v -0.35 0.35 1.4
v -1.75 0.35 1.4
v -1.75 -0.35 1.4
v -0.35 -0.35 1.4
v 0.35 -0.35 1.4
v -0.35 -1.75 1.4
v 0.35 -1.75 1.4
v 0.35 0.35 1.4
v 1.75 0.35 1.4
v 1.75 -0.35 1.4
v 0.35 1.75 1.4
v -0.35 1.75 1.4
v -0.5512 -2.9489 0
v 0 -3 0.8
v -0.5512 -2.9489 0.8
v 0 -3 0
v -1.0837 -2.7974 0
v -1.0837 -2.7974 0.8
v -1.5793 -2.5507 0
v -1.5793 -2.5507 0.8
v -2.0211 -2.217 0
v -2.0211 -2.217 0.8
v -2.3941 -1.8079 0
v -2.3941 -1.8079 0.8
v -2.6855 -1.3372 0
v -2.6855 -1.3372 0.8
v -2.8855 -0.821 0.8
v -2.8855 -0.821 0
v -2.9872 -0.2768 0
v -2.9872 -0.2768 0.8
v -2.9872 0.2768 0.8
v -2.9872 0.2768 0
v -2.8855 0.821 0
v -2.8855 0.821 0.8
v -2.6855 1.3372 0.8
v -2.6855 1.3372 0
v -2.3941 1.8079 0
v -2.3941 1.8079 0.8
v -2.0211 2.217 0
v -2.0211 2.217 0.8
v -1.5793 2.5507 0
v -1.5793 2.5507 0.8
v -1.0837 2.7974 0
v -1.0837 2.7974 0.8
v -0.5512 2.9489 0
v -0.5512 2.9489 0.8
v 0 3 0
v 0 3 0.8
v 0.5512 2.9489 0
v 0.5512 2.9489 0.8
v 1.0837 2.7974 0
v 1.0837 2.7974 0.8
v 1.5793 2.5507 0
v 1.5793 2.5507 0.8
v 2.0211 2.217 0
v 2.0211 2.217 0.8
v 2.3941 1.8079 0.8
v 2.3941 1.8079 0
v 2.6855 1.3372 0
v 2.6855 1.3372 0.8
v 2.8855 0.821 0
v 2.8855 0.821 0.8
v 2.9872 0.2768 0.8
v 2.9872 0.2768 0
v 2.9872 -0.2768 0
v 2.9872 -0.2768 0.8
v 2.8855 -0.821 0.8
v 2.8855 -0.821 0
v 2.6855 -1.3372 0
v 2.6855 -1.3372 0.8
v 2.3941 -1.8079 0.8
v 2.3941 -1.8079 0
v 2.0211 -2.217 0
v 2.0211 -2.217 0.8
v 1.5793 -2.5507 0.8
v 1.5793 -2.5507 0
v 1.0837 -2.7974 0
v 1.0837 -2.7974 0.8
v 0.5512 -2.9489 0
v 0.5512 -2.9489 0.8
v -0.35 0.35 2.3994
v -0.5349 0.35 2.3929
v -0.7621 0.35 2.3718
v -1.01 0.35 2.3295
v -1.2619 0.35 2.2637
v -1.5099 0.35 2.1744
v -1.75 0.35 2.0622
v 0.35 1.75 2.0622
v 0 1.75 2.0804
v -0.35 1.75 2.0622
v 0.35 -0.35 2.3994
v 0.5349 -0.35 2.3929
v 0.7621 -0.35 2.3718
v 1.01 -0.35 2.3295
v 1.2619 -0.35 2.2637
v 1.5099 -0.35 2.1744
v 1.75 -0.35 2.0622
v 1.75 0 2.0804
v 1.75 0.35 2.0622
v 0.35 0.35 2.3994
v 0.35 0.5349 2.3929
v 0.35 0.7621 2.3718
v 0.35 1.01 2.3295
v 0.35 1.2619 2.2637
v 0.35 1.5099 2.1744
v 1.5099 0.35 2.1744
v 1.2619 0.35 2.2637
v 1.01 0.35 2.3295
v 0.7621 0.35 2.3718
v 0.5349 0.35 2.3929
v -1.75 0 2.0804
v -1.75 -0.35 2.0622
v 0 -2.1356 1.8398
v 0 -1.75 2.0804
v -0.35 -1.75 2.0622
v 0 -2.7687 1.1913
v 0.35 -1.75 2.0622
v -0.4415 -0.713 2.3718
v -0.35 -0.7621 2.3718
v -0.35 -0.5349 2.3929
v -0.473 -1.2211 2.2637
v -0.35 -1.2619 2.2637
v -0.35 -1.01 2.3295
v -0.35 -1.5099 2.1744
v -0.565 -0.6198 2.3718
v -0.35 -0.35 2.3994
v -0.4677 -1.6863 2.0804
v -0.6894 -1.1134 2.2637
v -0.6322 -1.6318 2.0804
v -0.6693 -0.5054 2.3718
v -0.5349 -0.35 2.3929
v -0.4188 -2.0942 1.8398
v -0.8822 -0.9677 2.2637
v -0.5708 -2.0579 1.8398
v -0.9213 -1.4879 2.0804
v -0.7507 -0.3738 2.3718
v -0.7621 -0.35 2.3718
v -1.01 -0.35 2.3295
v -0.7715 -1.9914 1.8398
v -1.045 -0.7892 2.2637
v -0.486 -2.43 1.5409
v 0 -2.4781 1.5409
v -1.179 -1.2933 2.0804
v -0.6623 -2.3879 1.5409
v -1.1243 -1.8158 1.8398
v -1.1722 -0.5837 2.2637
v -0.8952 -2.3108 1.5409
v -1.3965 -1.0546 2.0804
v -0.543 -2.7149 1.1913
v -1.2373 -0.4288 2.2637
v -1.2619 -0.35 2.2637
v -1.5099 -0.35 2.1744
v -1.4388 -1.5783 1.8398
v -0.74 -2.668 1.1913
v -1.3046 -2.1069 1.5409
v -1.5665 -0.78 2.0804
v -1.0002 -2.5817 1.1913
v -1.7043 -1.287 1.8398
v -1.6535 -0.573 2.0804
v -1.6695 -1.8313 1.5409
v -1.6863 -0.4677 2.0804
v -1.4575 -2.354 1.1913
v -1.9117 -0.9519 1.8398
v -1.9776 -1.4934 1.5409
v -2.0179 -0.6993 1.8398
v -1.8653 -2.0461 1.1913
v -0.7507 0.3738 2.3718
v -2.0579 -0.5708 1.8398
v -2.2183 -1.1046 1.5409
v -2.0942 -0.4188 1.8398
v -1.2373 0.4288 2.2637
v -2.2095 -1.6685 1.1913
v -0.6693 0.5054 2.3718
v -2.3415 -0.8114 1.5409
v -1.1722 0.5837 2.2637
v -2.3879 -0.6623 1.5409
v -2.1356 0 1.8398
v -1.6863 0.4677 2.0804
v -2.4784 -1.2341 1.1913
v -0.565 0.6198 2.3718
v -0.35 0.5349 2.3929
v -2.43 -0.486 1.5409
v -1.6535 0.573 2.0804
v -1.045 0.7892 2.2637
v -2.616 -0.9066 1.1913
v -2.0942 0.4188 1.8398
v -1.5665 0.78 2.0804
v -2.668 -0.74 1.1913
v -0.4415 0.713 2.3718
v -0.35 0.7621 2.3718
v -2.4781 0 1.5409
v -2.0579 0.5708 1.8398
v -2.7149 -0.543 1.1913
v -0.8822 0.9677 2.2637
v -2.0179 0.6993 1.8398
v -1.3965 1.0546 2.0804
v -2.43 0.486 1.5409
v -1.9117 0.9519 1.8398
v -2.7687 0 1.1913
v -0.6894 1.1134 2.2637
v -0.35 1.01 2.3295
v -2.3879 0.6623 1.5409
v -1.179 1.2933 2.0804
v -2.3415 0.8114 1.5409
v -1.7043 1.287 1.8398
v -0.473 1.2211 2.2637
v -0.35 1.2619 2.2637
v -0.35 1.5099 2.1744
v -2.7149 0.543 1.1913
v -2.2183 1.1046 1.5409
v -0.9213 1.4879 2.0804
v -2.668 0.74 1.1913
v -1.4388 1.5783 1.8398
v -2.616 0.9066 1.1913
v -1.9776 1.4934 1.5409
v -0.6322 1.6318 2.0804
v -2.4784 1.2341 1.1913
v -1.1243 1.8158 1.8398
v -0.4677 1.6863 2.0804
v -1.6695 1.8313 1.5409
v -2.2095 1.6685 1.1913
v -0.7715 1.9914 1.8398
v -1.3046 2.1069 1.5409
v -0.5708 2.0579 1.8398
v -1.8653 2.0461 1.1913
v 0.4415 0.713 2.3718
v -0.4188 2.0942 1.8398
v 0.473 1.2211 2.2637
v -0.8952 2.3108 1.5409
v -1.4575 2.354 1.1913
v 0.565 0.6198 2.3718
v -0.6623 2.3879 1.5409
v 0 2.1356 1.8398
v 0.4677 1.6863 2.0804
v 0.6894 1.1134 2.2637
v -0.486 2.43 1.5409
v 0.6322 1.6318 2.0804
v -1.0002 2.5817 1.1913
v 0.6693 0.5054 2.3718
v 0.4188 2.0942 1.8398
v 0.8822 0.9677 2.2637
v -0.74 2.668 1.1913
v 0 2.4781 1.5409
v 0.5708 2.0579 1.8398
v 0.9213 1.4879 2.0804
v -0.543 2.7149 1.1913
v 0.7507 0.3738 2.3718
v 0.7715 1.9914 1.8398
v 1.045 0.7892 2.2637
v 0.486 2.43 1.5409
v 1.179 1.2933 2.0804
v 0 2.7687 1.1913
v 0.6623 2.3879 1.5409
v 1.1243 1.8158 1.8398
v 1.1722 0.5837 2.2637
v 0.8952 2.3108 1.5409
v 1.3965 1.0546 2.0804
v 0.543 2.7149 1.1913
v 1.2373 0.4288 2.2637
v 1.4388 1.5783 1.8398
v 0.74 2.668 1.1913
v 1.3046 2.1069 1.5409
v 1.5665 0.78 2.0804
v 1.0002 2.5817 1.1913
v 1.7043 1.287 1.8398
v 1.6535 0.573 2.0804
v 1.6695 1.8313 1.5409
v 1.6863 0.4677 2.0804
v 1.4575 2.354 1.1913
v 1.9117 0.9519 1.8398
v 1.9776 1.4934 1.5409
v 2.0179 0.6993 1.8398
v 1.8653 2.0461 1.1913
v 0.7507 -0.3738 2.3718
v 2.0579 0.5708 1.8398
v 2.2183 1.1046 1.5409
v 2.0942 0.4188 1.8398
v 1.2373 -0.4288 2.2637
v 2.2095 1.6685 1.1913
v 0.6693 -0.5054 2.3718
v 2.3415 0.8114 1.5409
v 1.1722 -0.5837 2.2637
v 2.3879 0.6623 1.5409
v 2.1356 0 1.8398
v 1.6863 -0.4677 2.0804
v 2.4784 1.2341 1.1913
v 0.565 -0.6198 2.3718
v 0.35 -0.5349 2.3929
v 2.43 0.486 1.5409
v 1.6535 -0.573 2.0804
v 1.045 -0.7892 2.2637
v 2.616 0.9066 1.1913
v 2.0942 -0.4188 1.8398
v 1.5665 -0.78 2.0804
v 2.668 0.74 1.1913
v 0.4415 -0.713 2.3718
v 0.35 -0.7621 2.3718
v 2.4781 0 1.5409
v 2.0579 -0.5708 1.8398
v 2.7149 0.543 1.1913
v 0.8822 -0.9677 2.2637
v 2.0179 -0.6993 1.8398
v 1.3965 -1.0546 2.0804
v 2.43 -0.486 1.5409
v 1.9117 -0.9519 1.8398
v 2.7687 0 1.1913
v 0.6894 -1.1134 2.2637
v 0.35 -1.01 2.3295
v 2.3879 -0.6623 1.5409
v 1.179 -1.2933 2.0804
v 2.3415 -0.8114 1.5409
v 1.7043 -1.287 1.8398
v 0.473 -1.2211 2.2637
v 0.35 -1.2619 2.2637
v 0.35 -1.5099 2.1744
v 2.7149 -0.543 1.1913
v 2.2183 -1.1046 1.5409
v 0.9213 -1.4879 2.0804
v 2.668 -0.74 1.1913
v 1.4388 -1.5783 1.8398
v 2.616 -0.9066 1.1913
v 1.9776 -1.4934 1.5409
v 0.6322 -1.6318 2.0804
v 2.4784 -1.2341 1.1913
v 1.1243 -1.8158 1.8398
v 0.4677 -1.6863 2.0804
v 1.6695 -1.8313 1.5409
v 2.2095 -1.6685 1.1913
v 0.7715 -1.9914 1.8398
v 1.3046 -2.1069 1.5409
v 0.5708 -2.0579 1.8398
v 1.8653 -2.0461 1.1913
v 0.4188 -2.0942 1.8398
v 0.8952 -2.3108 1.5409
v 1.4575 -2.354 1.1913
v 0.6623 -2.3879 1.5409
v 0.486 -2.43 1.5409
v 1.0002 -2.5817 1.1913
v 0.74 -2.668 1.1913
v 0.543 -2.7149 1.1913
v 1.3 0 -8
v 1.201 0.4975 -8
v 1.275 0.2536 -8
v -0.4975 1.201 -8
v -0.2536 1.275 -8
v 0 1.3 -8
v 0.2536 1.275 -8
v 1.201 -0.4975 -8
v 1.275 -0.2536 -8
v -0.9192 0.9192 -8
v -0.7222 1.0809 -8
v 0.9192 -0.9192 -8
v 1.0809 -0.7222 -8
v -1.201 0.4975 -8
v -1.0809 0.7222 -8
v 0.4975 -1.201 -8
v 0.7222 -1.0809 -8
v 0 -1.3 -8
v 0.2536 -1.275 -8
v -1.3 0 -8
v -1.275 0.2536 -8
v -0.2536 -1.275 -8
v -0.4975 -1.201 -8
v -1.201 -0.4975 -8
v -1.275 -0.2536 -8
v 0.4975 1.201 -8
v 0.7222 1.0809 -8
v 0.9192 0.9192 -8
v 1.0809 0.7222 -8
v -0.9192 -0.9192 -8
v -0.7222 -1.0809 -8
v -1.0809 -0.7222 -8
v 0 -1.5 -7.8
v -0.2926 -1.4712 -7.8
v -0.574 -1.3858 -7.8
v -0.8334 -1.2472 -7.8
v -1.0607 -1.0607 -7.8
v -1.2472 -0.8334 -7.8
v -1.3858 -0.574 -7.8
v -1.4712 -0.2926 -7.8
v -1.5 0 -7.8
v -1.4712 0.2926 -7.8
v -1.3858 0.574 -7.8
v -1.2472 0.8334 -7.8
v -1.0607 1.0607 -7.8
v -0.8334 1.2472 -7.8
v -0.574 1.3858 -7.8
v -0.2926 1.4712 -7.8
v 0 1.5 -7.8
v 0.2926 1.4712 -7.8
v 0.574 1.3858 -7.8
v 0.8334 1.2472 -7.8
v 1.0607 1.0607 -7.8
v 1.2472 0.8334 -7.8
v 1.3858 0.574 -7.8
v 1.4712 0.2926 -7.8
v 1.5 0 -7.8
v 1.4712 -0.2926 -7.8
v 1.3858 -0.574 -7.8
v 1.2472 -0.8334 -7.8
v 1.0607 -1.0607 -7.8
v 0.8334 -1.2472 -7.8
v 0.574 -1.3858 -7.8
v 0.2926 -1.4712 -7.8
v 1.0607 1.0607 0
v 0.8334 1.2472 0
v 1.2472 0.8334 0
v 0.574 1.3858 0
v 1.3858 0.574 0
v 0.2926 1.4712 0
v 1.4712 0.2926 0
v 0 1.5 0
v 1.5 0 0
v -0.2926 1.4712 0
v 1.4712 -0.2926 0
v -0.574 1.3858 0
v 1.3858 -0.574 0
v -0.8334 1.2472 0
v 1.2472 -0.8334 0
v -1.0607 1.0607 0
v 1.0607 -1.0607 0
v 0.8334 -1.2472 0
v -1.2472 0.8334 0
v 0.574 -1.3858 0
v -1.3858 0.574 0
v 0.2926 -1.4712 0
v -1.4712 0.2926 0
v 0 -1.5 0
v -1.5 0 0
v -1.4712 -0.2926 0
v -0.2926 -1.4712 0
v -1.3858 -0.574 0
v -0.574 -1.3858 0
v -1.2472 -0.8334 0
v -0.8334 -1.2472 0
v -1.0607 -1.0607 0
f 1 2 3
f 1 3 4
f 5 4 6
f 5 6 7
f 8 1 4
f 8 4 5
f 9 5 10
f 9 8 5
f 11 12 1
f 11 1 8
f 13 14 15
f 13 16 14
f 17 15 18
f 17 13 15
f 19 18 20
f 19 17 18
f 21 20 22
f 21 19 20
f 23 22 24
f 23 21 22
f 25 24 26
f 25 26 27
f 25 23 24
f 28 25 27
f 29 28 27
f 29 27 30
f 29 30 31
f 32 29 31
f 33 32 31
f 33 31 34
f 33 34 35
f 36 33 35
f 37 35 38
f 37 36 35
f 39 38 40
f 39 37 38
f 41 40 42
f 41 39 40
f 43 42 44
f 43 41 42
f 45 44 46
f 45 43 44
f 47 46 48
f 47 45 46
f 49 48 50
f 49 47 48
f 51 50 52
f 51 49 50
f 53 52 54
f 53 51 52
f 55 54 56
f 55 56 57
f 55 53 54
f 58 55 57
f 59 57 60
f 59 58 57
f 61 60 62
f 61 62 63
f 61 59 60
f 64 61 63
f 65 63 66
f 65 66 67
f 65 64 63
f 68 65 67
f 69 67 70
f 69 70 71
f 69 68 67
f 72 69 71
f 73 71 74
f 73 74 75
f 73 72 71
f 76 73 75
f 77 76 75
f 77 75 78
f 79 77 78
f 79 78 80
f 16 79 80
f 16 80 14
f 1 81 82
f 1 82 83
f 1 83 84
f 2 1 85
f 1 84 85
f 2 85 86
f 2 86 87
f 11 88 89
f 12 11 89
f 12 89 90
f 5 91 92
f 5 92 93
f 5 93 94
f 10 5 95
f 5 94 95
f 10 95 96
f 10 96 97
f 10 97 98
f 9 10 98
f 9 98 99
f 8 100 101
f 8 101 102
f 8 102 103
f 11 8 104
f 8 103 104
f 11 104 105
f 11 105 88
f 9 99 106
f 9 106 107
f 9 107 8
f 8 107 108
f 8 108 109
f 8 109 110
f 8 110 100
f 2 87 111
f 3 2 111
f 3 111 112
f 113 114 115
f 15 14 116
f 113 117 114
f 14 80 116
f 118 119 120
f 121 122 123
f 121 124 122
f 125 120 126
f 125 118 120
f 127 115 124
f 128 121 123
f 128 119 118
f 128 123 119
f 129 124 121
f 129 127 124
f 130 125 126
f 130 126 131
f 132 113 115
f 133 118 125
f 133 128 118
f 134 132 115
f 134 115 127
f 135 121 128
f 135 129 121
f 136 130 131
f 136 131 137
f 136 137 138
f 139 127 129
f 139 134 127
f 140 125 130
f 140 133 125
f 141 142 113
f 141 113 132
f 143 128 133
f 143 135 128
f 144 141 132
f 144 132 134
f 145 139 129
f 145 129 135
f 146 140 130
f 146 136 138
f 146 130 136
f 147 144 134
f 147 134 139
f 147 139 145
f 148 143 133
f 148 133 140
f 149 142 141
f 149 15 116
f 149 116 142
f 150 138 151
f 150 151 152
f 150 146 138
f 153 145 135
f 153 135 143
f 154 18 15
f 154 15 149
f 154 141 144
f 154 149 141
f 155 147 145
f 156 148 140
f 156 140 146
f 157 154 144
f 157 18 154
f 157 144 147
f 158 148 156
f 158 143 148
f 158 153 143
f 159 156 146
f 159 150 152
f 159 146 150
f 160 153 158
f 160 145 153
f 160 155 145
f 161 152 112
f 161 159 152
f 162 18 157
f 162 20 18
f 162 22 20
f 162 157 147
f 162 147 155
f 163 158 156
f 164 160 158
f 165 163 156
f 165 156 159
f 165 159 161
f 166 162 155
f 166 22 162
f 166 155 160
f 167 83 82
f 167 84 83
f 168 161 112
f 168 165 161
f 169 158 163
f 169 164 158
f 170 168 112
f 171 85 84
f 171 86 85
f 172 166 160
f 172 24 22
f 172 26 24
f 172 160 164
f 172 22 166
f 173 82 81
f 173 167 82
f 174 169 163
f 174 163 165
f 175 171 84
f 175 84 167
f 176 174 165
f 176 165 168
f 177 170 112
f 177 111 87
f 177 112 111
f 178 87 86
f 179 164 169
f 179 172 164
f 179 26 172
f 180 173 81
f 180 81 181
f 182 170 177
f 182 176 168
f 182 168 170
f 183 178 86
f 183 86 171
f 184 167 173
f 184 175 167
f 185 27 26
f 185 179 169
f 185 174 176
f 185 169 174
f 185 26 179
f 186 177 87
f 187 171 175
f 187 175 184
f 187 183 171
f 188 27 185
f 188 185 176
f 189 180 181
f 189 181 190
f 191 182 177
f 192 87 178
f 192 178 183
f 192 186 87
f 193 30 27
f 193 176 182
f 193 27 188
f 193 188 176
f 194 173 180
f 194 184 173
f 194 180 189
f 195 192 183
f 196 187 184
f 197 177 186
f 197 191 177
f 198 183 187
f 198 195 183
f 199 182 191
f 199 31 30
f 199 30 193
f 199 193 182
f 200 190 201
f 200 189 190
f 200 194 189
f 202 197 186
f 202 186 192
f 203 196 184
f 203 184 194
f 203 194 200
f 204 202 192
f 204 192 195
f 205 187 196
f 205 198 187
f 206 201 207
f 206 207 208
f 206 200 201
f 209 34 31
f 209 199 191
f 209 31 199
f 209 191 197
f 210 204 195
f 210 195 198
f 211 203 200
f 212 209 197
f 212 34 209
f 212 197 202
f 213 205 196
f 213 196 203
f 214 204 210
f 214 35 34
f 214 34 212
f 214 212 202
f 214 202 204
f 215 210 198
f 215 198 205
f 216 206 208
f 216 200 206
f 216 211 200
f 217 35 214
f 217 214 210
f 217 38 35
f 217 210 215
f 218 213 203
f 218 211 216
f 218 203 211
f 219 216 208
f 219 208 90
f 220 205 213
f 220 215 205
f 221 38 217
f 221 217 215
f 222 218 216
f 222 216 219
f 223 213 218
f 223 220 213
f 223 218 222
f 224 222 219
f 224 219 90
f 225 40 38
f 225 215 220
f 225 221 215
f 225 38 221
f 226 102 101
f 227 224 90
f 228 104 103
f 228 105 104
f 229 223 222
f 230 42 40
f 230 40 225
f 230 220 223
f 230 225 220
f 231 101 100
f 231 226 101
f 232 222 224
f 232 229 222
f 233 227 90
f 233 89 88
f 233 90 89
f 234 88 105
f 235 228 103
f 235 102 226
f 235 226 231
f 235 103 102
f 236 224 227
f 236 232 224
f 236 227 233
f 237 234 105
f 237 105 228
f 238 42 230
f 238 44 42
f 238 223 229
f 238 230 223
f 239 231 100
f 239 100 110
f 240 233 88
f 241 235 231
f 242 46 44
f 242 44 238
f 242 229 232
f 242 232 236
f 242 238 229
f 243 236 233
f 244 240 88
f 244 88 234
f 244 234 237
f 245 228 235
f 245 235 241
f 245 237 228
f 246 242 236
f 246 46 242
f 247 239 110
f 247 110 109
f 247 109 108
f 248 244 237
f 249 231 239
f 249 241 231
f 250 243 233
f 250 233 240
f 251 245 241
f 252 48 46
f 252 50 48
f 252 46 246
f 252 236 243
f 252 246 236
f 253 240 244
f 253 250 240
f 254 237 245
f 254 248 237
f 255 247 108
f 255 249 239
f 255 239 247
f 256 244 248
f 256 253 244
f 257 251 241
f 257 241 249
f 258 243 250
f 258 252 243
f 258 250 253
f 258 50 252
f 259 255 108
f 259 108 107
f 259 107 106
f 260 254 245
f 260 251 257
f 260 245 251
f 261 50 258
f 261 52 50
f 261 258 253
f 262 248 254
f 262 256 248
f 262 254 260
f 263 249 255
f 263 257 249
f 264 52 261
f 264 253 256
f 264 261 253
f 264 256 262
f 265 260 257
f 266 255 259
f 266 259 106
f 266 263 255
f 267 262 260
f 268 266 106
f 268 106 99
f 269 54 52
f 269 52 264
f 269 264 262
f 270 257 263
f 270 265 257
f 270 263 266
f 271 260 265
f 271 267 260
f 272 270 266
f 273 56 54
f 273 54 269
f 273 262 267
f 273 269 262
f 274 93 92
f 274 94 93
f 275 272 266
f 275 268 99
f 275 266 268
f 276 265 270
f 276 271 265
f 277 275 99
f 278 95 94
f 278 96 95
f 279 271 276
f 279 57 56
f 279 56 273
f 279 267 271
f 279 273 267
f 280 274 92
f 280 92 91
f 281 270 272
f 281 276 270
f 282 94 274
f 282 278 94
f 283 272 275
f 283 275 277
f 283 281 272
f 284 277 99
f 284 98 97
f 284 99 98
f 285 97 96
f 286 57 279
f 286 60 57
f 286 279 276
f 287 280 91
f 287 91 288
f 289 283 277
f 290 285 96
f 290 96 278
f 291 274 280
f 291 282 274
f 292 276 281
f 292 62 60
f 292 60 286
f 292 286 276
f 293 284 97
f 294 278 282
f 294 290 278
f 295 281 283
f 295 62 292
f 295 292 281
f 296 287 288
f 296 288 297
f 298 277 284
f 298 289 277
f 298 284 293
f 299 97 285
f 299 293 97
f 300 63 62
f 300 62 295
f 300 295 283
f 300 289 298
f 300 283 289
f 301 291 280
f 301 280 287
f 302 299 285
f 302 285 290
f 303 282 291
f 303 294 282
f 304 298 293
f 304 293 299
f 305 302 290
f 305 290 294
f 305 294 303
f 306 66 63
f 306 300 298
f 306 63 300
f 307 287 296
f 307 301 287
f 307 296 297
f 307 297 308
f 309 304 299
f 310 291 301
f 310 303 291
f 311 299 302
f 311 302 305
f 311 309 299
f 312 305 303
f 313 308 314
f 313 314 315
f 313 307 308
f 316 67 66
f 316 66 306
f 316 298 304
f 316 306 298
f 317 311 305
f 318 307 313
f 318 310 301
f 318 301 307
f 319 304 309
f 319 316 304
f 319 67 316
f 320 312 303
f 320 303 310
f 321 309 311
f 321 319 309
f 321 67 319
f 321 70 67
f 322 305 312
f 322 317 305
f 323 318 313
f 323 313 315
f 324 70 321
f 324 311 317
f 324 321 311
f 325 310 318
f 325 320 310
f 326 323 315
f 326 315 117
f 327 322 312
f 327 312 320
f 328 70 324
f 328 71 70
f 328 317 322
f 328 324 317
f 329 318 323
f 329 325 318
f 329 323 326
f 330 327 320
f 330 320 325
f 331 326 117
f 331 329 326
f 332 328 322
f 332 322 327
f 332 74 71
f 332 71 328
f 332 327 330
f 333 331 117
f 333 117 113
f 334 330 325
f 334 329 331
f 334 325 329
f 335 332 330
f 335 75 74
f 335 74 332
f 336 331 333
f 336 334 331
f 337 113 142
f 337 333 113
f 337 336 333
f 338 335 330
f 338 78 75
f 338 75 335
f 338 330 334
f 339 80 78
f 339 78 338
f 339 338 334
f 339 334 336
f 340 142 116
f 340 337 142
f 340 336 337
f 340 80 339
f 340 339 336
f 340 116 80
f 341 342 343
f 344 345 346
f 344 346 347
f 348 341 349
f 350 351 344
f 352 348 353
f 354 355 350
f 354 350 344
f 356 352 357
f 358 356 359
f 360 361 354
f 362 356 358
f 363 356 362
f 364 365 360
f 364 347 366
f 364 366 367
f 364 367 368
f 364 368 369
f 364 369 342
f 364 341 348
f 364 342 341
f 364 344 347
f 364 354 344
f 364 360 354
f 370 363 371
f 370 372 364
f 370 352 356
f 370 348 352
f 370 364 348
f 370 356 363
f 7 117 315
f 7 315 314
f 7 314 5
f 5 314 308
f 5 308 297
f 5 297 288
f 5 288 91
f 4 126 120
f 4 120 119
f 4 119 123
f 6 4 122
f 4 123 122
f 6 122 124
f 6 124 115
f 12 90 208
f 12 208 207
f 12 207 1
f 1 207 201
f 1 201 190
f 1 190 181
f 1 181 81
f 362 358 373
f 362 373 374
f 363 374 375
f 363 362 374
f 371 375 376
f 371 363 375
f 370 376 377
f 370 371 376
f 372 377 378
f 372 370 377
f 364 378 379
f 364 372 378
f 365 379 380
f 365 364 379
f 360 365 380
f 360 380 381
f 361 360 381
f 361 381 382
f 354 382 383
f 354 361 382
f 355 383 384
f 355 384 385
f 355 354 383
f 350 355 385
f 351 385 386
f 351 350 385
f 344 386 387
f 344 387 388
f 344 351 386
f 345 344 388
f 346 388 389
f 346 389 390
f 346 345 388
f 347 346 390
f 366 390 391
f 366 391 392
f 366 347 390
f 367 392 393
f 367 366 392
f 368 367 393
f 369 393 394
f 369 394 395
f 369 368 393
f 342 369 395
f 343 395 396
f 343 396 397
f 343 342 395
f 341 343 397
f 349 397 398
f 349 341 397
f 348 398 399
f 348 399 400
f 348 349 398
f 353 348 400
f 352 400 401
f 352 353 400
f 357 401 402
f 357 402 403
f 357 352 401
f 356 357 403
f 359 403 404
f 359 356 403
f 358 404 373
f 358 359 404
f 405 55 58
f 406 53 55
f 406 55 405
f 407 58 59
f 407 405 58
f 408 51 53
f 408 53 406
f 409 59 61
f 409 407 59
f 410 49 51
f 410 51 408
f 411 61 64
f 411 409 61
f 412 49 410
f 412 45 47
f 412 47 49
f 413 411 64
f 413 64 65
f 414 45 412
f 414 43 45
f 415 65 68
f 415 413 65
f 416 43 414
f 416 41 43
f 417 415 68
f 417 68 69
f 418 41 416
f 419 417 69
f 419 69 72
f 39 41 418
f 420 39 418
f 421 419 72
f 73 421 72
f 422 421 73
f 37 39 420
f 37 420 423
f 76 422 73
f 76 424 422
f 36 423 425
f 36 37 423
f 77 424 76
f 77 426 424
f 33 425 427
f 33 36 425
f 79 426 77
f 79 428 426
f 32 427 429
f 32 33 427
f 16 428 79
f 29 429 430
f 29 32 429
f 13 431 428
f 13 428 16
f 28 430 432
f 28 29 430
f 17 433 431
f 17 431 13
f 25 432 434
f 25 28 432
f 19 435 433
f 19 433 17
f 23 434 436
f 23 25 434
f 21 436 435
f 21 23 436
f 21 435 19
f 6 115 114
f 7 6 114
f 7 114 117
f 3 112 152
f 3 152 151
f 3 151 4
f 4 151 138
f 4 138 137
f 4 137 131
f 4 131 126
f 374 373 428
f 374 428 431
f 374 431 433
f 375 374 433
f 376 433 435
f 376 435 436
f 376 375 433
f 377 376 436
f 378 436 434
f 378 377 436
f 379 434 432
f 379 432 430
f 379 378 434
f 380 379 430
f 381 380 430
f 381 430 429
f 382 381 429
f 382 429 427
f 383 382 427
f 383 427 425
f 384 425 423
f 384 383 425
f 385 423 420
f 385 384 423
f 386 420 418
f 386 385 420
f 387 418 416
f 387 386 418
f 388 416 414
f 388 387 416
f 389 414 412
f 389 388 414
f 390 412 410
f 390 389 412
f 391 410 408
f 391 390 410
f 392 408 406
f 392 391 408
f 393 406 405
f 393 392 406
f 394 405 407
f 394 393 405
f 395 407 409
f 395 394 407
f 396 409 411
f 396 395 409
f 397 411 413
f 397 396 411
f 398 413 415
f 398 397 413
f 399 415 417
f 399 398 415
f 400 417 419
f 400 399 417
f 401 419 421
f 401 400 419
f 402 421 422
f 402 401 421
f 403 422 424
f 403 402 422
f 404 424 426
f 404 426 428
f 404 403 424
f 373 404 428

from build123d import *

# Parameters (mm, degrees)
CORTAR_EXTRUIR2_DEPTH = 1
CHAFL_N1_SIZE         = 0.2


with BuildPart() as part:
    # Croquis1 → Revolución1 (revolve)
    with BuildSketch(Plane(origin=(0, 0, 0), x_dir=(0, 0, -1), z_dir=(1, 0, 0)), mode=Mode.PRIVATE) as revoluci_n1_sk:
        with BuildLine():
            Line((0, 3), (0, 1.5))
            Line((0, 1.5), (8, 1.5))
            Line((8, 1.5), (8, 0))
            Line((8, 0), (-2.4, 0))
            Line((-2.4, 0), (-2.4, 0.438750305))
            ThreePointArc((-2.4, 0.438750305), (-1.967126393, 1.948717192), (-0.8, 3))
            Line((-0.8, 3), (0, 3))
        make_face()
    revolve(revoluci_n1_sk.sketch.rotate(Axis((0, 0, -8), (0, 0, -1)), 180), axis=Axis((0, 0, -8), (0, 0, -1)))

    # Croquis2 → Cortar-Extruir2 (cut)
    with BuildSketch(Plane.XY.offset(2.4)):
        Polygon((-0.35, 0.35), (-1.75, 0.35), (-1.75, -0.35), (-0.35, -0.35), (-0.35, -1.75), (0.35, -1.75), (0.35, -0.35), (1.75, -0.35), (1.75, 0.35), (0.35, 0.35), (0.35, 1.75), (-0.35, 1.75), align=None)
    extrude(amount=-CORTAR_EXTRUIR2_DEPTH, mode=Mode.SUBTRACT)

    # Chaflán1
    chafl_n1_edges = [part.edges().sort_by_distance(p)[0] for p in [
        (0, 1.5, -8),
    ]]
    chamfer(chafl_n1_edges, length=CHAFL_N1_SIZE)


solid = part.part
